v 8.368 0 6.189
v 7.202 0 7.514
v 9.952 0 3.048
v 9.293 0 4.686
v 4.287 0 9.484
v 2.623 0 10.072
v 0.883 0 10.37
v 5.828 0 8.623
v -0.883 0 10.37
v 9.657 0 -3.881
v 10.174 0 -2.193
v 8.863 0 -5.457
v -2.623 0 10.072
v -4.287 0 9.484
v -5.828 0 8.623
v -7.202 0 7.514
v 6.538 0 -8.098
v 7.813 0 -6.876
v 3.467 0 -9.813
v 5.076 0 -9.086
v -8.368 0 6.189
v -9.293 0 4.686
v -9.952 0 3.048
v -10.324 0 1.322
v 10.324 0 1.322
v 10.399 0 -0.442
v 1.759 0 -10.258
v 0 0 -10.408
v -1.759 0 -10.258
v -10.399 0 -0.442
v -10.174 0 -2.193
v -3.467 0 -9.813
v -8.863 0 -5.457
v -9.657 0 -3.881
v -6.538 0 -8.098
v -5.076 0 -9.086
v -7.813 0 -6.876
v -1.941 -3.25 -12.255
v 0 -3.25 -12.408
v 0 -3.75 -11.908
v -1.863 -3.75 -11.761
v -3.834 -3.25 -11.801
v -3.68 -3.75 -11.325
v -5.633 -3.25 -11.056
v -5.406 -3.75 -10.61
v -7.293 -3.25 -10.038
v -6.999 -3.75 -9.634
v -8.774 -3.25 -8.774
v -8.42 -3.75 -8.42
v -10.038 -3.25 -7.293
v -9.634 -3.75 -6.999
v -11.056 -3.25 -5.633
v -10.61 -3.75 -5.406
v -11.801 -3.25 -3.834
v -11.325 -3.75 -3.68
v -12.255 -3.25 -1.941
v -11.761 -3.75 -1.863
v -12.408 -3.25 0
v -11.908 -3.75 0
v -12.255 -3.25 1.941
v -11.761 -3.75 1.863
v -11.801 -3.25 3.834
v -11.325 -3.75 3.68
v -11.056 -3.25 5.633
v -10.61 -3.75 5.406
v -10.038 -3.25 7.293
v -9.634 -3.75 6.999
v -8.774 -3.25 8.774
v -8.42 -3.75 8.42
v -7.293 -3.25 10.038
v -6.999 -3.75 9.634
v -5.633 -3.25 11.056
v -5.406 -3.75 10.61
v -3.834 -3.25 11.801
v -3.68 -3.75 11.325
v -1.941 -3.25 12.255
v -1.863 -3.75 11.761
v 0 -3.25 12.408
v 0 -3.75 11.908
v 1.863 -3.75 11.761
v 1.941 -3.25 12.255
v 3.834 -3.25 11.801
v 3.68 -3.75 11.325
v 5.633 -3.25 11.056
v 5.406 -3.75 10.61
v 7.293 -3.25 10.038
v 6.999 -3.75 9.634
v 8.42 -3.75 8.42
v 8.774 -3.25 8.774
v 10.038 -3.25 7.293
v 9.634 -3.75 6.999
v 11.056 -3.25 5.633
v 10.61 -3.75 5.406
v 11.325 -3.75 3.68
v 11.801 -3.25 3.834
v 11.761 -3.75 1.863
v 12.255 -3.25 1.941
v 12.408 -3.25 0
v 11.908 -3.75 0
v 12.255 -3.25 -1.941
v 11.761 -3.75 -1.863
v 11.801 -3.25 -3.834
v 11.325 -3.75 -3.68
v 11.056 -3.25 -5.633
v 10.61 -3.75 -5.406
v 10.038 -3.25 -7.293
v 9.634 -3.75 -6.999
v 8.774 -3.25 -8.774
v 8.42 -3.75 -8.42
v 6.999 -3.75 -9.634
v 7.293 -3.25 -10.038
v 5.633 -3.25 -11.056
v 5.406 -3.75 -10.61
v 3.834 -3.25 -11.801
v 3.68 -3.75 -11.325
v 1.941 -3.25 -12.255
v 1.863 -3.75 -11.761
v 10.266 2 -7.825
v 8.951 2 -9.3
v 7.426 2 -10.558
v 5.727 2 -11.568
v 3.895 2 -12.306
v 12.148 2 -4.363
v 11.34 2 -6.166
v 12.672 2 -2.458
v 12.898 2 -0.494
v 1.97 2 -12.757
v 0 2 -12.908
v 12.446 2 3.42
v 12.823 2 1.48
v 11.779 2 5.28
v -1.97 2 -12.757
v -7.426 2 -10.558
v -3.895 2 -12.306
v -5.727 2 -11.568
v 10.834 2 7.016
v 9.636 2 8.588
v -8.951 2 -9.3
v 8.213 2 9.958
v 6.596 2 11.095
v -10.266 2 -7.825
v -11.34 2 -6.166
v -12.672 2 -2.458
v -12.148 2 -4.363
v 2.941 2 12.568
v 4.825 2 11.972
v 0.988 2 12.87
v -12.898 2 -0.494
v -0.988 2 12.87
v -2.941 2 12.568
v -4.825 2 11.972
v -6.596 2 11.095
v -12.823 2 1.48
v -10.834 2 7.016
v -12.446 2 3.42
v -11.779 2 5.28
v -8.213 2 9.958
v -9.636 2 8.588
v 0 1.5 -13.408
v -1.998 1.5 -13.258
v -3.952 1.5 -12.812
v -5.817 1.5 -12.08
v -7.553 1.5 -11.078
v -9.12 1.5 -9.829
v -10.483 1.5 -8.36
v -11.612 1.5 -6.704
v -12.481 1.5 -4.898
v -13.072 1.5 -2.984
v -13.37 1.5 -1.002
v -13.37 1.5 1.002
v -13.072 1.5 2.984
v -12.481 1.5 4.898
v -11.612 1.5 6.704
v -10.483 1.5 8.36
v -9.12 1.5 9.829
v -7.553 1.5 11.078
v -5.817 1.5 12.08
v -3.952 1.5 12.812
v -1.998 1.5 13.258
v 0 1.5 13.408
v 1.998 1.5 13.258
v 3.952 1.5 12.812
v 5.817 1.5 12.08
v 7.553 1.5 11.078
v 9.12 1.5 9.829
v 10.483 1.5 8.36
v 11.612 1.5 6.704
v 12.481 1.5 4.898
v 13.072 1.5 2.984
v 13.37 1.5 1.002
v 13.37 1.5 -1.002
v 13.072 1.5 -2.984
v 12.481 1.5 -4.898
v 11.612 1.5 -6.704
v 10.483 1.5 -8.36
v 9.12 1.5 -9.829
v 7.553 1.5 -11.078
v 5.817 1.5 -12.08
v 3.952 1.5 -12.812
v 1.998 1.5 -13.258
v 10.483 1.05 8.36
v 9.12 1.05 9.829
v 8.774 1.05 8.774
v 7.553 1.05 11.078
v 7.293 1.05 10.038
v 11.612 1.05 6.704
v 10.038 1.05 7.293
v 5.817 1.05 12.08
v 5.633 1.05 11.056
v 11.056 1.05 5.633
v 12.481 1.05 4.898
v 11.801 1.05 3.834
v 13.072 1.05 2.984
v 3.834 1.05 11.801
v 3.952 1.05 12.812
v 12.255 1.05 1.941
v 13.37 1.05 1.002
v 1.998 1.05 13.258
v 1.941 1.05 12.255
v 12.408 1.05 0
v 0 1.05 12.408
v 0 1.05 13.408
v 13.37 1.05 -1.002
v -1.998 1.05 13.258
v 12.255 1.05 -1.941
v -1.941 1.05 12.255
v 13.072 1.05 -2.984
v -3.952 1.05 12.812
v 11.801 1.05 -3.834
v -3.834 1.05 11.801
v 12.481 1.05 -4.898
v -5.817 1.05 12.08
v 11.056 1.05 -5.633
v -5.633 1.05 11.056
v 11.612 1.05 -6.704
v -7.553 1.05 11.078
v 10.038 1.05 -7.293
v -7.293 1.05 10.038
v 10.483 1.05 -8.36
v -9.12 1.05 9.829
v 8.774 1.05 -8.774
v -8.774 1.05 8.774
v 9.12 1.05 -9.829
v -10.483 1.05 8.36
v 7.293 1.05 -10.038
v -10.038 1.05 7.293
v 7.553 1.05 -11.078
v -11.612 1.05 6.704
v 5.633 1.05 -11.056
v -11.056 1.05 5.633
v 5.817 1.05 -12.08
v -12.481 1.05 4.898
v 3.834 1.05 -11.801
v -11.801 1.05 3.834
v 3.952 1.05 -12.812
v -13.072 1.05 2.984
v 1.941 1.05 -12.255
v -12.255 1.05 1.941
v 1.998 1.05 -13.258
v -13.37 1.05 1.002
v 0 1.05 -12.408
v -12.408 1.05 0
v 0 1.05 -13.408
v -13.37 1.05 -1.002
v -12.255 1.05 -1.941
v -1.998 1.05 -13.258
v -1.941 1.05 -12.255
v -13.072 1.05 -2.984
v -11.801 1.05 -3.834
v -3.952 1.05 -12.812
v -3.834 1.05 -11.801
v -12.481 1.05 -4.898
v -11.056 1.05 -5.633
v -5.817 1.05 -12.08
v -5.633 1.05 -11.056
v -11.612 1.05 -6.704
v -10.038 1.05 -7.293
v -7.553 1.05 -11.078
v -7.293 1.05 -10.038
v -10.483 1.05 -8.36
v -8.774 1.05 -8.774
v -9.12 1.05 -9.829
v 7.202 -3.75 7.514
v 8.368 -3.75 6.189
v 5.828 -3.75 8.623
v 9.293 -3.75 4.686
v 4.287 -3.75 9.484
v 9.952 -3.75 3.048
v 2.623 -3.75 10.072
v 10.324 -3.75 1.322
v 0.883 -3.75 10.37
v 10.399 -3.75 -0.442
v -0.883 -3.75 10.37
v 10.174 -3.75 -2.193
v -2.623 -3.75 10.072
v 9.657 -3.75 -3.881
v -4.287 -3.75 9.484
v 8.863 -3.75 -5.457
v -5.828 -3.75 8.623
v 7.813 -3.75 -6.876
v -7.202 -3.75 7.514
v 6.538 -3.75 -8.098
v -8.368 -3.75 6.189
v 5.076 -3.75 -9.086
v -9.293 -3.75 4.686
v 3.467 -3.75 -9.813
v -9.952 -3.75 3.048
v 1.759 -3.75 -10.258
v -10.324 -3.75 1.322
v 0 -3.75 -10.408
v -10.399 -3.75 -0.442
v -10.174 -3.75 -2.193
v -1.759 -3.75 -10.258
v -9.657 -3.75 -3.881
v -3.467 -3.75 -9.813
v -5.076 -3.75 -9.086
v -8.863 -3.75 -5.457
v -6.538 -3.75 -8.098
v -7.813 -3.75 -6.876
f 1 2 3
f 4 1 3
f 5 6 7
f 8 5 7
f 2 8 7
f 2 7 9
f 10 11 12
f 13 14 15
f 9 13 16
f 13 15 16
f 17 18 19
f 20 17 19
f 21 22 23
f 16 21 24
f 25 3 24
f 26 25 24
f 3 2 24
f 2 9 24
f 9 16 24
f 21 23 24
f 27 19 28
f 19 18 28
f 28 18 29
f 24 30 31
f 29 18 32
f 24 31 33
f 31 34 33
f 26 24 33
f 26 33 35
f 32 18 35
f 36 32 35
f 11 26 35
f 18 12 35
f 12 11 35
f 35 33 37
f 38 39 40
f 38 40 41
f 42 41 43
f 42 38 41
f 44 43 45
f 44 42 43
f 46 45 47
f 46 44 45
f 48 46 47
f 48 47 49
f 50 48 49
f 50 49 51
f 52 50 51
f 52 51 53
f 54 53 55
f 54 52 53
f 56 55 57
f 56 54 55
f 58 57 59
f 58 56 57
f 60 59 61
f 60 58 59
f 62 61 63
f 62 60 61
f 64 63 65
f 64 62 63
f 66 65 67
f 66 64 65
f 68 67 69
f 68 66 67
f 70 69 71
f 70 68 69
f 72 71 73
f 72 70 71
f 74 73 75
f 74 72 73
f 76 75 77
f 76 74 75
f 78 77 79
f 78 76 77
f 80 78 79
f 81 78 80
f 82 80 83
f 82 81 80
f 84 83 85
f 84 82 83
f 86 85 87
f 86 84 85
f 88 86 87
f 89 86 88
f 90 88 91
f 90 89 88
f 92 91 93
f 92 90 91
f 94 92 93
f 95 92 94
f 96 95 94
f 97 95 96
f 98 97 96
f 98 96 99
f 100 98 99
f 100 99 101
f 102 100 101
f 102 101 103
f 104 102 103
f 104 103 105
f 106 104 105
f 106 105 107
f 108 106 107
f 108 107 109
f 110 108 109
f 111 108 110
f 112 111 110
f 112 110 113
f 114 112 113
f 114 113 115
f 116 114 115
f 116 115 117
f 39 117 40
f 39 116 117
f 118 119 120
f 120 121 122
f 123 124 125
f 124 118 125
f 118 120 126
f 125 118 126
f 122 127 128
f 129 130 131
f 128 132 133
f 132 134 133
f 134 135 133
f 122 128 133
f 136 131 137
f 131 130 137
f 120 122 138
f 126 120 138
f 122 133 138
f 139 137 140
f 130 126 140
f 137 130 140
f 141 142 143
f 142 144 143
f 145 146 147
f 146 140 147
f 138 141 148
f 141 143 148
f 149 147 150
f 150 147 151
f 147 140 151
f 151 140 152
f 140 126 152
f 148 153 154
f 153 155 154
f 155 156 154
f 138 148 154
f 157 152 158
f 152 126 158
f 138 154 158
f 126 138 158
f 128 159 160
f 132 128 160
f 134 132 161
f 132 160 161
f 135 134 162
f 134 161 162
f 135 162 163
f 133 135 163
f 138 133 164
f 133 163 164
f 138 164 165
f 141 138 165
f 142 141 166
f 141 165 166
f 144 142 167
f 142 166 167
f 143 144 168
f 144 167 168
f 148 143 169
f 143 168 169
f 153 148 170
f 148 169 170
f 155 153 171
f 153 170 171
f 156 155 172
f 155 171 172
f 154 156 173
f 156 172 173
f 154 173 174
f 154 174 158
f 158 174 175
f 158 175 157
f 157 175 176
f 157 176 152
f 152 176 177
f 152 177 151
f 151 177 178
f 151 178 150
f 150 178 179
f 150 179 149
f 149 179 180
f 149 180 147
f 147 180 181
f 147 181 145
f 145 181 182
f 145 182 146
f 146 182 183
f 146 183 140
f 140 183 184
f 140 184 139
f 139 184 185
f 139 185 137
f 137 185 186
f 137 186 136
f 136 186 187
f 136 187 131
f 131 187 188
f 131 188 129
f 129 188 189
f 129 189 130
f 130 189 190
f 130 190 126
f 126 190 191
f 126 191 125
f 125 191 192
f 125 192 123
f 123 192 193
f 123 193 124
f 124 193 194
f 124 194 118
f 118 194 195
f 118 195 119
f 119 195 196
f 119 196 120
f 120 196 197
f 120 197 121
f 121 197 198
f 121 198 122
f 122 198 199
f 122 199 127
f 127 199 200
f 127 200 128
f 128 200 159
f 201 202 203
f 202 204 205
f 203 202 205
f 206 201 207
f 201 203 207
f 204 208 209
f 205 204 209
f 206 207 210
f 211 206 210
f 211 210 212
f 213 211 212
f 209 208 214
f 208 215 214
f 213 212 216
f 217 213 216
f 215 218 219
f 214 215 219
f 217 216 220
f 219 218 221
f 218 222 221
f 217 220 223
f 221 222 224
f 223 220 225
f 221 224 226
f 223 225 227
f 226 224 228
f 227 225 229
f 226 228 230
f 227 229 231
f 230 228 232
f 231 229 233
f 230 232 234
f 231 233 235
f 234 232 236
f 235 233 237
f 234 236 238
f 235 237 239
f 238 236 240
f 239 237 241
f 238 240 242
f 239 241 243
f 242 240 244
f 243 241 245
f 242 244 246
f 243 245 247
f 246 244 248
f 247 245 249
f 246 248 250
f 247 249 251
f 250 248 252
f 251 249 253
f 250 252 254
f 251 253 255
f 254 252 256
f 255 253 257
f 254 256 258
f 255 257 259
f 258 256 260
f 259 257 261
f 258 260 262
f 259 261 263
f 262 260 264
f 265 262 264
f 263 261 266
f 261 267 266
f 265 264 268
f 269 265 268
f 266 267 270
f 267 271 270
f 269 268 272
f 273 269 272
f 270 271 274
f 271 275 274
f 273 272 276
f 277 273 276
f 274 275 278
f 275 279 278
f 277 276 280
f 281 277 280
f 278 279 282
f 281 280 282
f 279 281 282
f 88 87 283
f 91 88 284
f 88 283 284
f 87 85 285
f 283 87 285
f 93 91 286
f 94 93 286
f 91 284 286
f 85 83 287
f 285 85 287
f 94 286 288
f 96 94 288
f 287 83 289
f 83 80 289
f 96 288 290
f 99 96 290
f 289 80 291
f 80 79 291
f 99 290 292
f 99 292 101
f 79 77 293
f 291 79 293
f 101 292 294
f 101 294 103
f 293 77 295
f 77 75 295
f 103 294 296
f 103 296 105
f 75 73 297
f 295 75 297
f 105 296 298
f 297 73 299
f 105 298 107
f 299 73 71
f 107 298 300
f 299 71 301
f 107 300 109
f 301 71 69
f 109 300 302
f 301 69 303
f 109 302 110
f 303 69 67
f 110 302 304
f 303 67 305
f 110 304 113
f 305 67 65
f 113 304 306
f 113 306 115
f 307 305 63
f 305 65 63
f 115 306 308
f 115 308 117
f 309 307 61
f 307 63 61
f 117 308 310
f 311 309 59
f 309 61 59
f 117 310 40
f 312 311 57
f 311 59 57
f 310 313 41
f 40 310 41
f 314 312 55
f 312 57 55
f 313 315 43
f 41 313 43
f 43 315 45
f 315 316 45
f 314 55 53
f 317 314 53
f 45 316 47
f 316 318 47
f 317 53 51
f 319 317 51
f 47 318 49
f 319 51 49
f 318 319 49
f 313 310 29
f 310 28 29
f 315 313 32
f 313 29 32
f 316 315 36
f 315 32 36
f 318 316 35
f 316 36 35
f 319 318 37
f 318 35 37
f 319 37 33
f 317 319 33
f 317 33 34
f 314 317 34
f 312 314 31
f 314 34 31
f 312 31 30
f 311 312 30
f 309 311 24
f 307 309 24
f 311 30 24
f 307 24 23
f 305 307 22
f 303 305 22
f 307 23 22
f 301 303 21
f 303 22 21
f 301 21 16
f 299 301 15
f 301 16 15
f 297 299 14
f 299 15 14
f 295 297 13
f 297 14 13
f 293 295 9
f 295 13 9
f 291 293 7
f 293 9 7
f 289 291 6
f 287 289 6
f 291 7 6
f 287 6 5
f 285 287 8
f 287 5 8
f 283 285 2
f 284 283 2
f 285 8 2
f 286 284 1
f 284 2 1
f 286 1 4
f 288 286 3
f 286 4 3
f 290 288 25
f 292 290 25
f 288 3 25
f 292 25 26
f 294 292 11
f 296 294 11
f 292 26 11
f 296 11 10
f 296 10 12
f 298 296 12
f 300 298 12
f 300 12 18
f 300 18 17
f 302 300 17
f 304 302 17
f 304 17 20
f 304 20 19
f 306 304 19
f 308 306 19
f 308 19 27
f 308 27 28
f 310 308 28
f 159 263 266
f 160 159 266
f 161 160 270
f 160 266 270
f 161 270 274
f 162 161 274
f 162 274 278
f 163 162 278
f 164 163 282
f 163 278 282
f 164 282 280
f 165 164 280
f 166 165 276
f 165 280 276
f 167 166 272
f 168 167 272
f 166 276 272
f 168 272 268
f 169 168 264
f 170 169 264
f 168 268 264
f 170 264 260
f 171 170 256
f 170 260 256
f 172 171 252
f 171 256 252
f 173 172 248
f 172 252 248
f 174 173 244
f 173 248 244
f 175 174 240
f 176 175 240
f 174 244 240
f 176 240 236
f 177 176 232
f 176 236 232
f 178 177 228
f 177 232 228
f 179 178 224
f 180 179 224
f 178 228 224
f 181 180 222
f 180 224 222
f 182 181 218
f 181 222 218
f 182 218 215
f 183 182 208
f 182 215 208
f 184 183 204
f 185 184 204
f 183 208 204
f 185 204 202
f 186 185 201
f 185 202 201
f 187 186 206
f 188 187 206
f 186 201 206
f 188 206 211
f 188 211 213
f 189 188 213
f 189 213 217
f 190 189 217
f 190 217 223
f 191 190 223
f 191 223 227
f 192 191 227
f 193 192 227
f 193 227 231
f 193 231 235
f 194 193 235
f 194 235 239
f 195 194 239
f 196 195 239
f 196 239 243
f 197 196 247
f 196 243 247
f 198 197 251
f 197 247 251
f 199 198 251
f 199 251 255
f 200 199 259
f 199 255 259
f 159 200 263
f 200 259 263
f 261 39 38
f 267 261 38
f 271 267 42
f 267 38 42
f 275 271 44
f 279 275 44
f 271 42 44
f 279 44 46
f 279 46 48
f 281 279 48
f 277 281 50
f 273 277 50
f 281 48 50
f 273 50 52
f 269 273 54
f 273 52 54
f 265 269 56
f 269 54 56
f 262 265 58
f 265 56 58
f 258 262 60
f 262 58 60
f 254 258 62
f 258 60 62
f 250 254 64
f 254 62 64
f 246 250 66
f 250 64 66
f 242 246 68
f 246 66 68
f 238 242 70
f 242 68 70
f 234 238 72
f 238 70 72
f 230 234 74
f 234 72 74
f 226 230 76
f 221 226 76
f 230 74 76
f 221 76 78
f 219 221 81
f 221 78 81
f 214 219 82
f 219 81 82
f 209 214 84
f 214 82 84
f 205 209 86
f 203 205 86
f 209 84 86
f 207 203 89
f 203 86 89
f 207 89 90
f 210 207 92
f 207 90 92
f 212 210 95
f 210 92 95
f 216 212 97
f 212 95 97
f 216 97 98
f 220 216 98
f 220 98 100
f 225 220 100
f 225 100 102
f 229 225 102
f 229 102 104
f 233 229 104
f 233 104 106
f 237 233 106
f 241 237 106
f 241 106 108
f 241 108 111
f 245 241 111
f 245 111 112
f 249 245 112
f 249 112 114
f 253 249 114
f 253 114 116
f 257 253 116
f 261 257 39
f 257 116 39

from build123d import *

# Parameters (mm, degrees)
CHAMFER1_SIZE = 0.5


with BuildPart() as part:
    # Sketch2 → Revolve1 (revolve)
    with BuildSketch(Plane.XY, mode=Mode.PRIVATE) as revolve1_sk:
        Polygon((12.4079, -3.75), (10.4079, -3.75), (10.4079, 0), (0, 0), (0, 2), (13.4079, 2), (13.4079, 1.05), (12.4079, 1.05), align=None)
    revolve(revolve1_sk.sketch.rotate(Axis((0, 0, 0), (0, 1, 0)), 90), axis=Axis((0, 0, 0), (0, 1, 0)))  # turned: the seam where the file's is

    # Chamfer1
    chamfer1_edges = [part.edges().sort_by_distance(p)[0] for p in [
        (0, -3.75, 12.4079),
        (0, 2, 13.4079),
    ]]
    chamfer(chamfer1_edges, length=CHAMFER1_SIZE)


solid = part.part
